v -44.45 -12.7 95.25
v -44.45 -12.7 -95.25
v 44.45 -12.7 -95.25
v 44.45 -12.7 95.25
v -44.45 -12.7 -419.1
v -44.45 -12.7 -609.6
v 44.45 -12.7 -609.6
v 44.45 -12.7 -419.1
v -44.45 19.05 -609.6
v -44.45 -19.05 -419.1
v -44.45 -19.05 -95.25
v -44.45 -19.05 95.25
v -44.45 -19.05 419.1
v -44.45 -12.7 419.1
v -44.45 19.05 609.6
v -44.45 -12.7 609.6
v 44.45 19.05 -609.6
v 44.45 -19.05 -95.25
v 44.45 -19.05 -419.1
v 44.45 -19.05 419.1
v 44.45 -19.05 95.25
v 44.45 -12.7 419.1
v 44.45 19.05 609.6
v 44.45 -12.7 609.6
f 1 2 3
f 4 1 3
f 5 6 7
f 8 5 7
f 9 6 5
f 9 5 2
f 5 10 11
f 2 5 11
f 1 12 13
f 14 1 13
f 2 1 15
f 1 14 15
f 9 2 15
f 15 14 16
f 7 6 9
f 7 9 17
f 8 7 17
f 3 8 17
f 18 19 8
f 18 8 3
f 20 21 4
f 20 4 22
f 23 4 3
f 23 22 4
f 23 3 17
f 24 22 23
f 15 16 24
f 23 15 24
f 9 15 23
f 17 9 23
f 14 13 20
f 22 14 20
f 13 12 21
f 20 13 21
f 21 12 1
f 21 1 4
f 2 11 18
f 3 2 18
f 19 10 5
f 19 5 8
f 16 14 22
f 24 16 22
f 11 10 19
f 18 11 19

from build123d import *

# Parameters (mm, degrees)
F0_W     = 88.9
F0_H     = 1219.2
F1_DEPTH = 19.05
F2_W     = 88.9
F2_H     = 190.5
F3_DEPTH = 6.35


with BuildPart() as f1:
    # F0 (on Front) → F1 (new body, symmetric)
    with BuildSketch(Plane.XZ):
        Rectangle(F0_W, F0_H)
    extrude(amount=F1_DEPTH, both=True)

    # F2 (on face) → F3 (cut)
    with BuildSketch(Plane.XZ.offset(19.05)):
        with Locations((0, -514.35)):
            Rectangle(F2_W, F2_H)
        Rectangle(F2_W, F2_H)
        with Locations((0, 514.35)):
            Rectangle(F2_W, F2_H)
    extrude(amount=-F3_DEPTH, mode=Mode.SUBTRACT)


solid = f1.part
